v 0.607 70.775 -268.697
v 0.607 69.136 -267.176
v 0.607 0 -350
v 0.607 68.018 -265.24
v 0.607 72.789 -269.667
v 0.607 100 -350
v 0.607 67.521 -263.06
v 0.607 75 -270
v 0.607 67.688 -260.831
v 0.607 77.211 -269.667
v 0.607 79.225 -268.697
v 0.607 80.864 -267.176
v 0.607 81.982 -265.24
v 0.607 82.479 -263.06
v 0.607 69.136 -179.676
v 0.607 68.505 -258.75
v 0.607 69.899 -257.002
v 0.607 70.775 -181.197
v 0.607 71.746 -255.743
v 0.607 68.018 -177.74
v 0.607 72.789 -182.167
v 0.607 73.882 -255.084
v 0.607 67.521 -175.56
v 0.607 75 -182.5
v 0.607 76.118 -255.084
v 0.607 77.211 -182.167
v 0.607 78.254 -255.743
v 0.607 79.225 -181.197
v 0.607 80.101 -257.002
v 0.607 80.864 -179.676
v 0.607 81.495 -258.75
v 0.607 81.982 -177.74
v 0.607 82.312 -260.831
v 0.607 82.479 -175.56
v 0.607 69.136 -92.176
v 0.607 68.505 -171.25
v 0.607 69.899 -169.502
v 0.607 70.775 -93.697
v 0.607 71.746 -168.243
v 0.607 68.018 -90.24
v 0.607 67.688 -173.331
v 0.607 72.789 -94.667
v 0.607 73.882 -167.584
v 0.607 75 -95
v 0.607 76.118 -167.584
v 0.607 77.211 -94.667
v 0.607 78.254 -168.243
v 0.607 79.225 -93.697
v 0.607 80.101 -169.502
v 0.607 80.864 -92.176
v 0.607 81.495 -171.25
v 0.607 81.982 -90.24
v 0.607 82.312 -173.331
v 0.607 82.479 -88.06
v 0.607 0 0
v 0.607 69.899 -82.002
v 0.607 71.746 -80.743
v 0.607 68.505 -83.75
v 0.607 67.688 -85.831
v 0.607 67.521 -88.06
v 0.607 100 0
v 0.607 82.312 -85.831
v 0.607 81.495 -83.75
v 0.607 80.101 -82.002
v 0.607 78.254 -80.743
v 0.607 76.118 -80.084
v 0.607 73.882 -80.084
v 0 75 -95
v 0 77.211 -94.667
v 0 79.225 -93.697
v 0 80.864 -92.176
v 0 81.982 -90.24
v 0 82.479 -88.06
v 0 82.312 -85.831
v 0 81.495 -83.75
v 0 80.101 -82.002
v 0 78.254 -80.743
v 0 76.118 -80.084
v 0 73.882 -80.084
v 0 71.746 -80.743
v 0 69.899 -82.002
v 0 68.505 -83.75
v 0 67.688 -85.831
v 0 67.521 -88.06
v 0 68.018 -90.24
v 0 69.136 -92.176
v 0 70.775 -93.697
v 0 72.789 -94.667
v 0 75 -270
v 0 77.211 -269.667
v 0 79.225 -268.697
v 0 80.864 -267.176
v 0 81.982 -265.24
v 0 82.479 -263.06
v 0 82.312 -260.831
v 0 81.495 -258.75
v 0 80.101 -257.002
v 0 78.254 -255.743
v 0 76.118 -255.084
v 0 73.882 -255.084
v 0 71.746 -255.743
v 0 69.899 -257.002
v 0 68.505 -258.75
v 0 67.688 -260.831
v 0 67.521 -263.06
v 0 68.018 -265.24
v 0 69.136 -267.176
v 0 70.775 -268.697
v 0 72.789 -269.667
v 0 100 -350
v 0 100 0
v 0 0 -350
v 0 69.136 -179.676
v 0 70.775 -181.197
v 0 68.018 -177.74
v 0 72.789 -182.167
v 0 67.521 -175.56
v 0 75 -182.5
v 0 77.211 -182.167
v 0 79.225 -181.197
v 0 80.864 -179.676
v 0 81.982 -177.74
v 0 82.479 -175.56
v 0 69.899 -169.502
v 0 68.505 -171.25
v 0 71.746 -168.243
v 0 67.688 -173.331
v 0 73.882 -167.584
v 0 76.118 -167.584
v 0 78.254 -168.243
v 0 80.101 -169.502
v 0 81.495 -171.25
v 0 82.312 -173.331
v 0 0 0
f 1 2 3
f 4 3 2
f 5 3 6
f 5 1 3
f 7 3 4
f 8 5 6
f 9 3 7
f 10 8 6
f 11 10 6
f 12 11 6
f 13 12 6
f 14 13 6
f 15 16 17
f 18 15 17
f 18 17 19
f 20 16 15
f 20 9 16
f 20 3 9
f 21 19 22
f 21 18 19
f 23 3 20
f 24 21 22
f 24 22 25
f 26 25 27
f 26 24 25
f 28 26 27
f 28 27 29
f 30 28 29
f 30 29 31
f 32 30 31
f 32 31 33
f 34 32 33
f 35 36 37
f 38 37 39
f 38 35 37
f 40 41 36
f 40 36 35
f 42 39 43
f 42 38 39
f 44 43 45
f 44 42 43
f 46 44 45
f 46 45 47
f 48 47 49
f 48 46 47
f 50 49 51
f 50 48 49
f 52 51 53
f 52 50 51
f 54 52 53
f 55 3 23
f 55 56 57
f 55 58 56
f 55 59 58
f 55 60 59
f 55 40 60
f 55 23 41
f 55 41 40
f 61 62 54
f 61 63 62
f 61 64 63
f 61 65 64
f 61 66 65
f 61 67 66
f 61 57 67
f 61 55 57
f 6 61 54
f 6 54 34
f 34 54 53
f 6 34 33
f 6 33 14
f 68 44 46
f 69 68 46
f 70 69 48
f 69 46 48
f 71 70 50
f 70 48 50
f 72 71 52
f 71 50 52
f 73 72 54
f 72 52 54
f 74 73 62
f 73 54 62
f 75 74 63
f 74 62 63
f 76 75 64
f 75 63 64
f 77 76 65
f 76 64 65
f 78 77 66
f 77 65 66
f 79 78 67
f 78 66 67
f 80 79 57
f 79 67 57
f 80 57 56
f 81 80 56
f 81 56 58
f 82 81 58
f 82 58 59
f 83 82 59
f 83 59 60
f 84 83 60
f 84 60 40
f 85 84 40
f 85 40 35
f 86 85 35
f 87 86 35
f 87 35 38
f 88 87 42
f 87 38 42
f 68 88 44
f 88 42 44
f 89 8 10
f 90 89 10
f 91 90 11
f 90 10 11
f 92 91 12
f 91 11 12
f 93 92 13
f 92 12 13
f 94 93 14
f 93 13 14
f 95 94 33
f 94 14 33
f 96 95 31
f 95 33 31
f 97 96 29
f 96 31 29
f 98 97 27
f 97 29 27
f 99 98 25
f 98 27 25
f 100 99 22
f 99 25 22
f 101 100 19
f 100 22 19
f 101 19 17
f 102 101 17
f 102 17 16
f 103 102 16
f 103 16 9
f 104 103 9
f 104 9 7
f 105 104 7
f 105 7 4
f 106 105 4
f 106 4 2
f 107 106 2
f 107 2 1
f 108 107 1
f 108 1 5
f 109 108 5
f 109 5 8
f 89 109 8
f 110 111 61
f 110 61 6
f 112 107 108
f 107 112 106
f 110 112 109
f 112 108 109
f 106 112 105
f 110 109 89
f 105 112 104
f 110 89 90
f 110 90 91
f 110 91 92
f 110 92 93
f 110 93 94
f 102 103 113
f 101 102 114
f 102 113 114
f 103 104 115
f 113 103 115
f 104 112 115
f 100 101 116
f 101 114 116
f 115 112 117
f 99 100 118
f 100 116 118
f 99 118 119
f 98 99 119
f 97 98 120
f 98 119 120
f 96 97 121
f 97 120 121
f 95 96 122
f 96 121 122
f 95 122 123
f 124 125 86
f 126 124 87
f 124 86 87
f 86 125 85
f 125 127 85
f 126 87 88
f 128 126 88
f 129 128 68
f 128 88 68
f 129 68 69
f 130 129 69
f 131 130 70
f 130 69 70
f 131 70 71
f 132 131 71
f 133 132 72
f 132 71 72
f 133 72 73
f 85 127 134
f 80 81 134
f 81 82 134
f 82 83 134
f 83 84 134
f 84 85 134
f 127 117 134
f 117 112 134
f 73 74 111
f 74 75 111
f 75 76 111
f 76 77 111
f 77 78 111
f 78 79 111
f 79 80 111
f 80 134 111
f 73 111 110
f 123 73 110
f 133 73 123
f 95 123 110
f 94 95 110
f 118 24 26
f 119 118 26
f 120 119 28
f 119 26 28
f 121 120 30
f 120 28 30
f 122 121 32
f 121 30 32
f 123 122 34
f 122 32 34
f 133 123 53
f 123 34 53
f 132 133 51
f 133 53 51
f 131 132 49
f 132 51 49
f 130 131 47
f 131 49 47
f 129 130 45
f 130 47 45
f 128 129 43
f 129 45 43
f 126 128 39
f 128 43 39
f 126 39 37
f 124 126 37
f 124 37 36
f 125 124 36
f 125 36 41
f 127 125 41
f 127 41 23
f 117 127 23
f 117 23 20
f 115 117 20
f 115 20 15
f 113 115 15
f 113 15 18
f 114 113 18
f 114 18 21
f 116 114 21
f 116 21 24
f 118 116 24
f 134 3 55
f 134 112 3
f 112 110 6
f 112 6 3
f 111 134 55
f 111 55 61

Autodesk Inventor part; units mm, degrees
ref_plane "YZ Plane" through (0, 0, 0) normal (1, 0, 0) x (0, 1, 0)
ref_plane "XZ Plane" through (0, 0, 0) normal (0, 1, 0) x (-1, 0, 0)
ref_plane "XY Plane" through (0, 0, 0) normal (0, 0, 1) x (1, 0, 0)
sketch "Sketch1" plane through (0, 0, 0) normal (1, 0, 0) x (0, 1, 0)
  line L0 (0, 0) -> (100, 0)
  line L1 (100, 0) -> (100, -350)
  line L2 (100, -350) -> (0, -350)
  line L3 (0, -350) -> (0, 0)
  dimension "d0" = 100
  dimension "d1" = 350
extrude "Extrusion1" add sketch "Sketch1" along normal blind 0.607
sketch "Sketch2" plane through (0.607, 0, 0) normal (1, 0, 0) x (0, 0, -1)
  line L0 (350, 100) -> (0, 100) projected
  line L1 (0, 100) -> (175, 100)
  line L2 (175, 100) -> (175, 75)
  circle A0 centre (175, 75) radius 7.5
  line L3 (175, 75) -> (87.5, 75)
  line L4 (175, 75) -> (262.5, 75)
  circle A1 centre (87.5, 75) radius 7.5
  circle A2 centre (262.5, 75) radius 7.5
  point P0 (0, 0)
  dimension "d4" = 175
  dimension "d5" = 25
  dimension "d6" = 15
  dimension "d10" = 15
  dimension "d11" = 15
  dimension "d12" = 87.5
extrude "Extrusion2" cut sketch "Sketch2" against normal through all
equation "\"BendRadius\" = Thickness"
equation "\"BendReliefWidth\" = Thickness"
equation "\"BendReliefDepth\" = 0.5 * Thickness"
equation "\"CornerReliefSize\" = 4 * Thickness"
equation "\"MinimumRemnant\" = 2 * Thickness"
equation "\"TransitionRadius\" = BendRadius"
equation "\"JacobiRadiusSize\" = BendRadius"
equation "\"GapSize\" = Thickness"
equation "\"Thickness\" = 3.048"
properties part number "project support plate small" material "Steel, Galvanized"
